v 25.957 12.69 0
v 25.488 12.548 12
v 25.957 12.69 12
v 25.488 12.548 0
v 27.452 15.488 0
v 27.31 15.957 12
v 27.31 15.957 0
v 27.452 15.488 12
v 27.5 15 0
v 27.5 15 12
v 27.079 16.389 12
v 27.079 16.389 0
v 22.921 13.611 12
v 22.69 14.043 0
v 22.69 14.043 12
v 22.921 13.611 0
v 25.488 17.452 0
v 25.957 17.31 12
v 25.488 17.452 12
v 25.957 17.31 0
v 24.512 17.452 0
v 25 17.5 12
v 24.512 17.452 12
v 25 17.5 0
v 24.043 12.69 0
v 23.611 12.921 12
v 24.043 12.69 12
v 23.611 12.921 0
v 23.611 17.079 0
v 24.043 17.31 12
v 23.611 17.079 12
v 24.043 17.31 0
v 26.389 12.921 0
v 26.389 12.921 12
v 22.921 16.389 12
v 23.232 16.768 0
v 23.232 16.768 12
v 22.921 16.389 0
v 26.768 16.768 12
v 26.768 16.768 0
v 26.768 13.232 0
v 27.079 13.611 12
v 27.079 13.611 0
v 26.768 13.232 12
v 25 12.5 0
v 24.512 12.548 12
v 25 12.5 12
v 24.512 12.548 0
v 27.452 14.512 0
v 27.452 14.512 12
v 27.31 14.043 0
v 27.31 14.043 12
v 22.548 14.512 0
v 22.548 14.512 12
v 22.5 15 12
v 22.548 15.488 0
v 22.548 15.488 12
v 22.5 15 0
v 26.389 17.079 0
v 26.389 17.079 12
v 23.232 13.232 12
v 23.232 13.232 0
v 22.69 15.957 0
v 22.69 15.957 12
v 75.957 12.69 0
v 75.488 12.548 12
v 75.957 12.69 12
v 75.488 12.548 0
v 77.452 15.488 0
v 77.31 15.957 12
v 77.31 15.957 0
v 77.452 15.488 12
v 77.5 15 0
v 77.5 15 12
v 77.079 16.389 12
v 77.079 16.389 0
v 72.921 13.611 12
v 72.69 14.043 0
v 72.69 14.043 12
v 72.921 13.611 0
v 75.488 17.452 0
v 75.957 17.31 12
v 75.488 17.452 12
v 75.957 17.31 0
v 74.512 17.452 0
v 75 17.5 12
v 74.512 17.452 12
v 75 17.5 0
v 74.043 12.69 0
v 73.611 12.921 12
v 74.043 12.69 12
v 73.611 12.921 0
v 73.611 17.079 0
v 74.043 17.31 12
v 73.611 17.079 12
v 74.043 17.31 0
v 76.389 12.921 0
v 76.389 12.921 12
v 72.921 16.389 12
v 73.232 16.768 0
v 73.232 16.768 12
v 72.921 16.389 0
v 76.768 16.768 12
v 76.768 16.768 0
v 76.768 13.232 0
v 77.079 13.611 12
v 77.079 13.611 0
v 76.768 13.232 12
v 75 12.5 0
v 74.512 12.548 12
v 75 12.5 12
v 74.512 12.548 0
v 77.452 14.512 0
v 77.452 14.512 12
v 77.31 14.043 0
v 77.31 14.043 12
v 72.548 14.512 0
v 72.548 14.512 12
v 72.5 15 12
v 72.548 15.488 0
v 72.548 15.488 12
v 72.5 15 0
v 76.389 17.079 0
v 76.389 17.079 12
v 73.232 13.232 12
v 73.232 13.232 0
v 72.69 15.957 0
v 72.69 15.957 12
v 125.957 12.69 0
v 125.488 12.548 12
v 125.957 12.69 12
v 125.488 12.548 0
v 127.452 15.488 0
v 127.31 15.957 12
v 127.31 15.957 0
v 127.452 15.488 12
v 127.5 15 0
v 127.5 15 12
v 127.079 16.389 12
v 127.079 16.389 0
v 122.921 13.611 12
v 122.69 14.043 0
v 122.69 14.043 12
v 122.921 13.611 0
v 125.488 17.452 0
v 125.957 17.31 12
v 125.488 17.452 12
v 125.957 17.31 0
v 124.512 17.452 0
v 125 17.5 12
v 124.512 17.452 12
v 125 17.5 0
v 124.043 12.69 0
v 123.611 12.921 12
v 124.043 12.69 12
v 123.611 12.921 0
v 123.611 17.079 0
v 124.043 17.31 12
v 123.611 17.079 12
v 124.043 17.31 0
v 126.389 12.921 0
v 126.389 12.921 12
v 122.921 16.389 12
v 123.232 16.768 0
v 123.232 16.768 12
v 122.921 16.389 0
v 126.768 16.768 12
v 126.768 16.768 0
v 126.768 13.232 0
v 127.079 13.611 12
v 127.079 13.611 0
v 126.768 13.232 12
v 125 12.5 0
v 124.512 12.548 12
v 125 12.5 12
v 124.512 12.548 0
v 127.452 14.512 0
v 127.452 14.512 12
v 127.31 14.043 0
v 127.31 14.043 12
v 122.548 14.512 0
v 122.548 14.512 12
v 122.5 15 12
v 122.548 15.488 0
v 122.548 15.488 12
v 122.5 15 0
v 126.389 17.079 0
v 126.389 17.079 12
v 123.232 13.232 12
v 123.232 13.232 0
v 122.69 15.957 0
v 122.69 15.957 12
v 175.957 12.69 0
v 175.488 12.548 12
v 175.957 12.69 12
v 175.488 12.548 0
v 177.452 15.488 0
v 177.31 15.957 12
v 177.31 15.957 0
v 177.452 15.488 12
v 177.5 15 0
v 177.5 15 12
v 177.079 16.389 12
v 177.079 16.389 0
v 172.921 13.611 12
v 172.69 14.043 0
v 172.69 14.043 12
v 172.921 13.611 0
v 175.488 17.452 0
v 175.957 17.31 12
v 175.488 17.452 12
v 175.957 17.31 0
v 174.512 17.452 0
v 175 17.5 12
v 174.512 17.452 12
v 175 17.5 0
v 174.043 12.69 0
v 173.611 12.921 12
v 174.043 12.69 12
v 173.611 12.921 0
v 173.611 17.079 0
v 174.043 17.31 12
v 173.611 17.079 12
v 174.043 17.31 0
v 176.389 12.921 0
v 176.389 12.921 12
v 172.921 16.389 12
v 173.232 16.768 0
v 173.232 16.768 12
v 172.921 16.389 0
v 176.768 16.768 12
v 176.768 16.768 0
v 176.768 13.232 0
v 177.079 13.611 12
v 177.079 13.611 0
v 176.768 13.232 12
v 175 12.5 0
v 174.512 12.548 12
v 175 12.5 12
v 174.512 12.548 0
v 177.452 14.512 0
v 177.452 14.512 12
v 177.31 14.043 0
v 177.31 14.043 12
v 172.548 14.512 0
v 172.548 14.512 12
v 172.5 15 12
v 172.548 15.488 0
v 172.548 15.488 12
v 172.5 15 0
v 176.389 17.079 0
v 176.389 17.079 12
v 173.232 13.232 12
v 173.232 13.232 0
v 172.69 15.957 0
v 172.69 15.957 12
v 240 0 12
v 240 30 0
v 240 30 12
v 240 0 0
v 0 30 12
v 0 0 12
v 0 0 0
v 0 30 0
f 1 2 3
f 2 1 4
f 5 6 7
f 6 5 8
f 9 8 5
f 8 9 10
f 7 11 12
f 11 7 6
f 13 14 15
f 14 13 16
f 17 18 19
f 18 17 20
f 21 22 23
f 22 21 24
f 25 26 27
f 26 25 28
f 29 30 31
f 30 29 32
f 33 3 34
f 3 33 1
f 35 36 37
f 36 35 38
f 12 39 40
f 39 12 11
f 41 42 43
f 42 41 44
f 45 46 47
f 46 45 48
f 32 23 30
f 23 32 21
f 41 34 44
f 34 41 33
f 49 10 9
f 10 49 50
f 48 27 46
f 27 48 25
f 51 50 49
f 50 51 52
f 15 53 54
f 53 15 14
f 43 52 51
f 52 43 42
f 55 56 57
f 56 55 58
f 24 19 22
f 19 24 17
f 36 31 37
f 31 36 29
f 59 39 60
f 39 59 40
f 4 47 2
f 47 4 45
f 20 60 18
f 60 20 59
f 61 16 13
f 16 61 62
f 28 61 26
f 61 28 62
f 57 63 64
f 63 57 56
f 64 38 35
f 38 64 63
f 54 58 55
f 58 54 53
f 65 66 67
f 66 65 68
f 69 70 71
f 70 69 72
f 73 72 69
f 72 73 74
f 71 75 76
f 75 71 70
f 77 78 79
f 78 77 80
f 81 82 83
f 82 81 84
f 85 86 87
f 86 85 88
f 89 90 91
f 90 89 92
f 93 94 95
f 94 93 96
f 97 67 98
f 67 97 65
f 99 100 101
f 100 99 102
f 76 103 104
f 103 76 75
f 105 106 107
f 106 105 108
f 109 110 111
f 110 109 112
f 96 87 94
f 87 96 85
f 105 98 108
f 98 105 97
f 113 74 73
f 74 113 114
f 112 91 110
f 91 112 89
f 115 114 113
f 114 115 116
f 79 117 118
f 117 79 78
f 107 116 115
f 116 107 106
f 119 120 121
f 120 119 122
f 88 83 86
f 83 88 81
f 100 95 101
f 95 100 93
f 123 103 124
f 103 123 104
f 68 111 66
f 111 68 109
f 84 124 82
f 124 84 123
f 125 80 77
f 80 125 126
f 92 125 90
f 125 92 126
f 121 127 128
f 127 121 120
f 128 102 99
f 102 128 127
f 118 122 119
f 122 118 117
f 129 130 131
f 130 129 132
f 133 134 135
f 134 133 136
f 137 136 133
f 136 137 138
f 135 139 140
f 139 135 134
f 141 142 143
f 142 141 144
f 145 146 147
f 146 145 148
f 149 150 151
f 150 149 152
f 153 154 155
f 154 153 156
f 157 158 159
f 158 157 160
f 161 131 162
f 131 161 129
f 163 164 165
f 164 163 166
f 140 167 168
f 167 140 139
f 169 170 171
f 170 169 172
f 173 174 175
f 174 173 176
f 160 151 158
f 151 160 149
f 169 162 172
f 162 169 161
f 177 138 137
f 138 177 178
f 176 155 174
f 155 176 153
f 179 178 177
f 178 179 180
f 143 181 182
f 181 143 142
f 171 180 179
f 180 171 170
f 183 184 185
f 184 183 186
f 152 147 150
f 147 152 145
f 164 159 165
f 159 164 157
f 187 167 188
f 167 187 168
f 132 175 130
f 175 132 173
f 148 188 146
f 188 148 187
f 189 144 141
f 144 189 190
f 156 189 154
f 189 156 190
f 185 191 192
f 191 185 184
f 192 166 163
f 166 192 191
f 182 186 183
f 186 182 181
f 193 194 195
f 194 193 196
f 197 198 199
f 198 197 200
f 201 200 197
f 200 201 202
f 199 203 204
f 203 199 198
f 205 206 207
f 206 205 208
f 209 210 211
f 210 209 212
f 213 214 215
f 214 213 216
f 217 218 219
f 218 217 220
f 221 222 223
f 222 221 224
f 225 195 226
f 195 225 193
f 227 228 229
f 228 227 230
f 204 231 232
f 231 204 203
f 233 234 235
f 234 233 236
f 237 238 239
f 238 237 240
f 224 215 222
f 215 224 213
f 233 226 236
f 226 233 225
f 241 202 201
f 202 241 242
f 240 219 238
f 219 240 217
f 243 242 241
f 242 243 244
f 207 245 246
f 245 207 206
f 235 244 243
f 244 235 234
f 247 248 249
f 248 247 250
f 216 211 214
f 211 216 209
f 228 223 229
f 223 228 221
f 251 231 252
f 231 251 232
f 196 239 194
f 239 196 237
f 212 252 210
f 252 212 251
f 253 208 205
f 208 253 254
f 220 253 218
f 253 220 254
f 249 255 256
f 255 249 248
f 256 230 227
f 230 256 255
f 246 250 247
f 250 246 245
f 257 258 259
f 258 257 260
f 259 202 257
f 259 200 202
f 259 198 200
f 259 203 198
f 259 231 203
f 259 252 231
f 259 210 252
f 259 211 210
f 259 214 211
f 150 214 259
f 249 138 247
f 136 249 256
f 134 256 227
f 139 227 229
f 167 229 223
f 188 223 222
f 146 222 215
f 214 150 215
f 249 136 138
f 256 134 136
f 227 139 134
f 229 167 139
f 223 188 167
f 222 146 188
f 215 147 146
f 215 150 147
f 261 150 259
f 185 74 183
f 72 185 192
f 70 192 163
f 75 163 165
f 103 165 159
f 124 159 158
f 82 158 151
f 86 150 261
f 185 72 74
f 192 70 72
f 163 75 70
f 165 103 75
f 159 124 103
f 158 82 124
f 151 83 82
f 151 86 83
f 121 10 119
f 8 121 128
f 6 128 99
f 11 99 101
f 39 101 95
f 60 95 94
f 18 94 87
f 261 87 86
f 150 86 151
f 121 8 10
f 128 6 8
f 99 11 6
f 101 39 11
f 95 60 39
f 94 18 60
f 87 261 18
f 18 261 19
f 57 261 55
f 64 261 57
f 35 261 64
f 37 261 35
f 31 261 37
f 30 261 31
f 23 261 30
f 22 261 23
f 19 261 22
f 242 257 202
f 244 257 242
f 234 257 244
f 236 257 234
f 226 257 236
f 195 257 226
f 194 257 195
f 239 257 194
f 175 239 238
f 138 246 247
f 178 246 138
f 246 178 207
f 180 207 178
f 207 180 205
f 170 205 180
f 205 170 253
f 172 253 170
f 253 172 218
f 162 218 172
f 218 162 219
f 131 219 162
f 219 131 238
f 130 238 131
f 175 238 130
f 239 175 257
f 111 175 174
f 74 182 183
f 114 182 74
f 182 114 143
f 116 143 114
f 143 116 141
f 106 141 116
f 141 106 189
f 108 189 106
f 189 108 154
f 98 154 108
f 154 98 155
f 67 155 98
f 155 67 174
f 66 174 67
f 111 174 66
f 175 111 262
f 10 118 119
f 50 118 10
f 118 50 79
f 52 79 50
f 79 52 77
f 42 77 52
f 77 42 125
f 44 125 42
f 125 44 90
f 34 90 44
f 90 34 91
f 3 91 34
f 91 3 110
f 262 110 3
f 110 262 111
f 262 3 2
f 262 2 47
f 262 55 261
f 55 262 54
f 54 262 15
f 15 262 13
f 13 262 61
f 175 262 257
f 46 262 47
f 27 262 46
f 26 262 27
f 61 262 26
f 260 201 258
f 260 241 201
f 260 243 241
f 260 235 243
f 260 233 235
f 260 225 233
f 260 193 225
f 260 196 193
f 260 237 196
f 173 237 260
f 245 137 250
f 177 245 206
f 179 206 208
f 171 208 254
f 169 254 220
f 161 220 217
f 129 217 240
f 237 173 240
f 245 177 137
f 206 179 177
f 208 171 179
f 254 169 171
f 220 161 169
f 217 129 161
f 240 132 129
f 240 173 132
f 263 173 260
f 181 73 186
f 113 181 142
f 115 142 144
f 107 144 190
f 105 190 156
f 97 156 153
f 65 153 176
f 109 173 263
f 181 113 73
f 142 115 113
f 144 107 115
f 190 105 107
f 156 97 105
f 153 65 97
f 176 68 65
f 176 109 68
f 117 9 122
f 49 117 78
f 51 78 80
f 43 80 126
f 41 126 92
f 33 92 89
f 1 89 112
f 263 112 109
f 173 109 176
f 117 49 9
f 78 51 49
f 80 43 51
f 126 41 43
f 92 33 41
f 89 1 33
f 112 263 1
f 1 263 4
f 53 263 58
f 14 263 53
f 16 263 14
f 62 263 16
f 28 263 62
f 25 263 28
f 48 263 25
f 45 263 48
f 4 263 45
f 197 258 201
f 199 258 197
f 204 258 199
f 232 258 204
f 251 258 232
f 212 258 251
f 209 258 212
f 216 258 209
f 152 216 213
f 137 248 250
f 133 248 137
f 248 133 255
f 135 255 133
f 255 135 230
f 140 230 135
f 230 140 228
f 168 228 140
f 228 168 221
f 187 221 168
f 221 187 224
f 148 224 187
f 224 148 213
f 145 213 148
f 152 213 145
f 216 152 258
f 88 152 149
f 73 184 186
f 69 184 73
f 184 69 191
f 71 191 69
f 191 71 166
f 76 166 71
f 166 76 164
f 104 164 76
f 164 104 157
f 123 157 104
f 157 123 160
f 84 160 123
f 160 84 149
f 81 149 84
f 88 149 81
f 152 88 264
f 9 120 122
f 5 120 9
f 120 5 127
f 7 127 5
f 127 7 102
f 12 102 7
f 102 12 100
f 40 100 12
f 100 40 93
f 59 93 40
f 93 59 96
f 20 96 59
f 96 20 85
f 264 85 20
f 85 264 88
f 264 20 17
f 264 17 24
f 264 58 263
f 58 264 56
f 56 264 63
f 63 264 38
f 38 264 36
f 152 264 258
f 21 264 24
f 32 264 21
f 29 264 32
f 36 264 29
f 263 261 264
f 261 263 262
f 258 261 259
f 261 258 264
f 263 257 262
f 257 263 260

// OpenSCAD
$fn = 32;

// ----------------------------------------------------------------------
// Long rail: 200-250 mm mounting rail
// ----------------------------------------------------------------------

// --- parameters (mm) ---
rail_l = 240;             // rail length, X
rail_w = 30;              // rail width, Y
rail_t = 12;              // rail thickness, Z
hole_d = 5;               // mounting hole diameter
hole_start = 25;          // first hole offset from the end
hole_pitch = 50;          // hole pitch
holes = 4;                // number of holes

difference() {
  cube([rail_l, rail_w, rail_t]);
  for (i = [0 : holes - 1])
    translate([hole_start + i * hole_pitch, rail_w / 2, -1])
      cylinder(h = rail_t + 2, d = hole_d);
}
